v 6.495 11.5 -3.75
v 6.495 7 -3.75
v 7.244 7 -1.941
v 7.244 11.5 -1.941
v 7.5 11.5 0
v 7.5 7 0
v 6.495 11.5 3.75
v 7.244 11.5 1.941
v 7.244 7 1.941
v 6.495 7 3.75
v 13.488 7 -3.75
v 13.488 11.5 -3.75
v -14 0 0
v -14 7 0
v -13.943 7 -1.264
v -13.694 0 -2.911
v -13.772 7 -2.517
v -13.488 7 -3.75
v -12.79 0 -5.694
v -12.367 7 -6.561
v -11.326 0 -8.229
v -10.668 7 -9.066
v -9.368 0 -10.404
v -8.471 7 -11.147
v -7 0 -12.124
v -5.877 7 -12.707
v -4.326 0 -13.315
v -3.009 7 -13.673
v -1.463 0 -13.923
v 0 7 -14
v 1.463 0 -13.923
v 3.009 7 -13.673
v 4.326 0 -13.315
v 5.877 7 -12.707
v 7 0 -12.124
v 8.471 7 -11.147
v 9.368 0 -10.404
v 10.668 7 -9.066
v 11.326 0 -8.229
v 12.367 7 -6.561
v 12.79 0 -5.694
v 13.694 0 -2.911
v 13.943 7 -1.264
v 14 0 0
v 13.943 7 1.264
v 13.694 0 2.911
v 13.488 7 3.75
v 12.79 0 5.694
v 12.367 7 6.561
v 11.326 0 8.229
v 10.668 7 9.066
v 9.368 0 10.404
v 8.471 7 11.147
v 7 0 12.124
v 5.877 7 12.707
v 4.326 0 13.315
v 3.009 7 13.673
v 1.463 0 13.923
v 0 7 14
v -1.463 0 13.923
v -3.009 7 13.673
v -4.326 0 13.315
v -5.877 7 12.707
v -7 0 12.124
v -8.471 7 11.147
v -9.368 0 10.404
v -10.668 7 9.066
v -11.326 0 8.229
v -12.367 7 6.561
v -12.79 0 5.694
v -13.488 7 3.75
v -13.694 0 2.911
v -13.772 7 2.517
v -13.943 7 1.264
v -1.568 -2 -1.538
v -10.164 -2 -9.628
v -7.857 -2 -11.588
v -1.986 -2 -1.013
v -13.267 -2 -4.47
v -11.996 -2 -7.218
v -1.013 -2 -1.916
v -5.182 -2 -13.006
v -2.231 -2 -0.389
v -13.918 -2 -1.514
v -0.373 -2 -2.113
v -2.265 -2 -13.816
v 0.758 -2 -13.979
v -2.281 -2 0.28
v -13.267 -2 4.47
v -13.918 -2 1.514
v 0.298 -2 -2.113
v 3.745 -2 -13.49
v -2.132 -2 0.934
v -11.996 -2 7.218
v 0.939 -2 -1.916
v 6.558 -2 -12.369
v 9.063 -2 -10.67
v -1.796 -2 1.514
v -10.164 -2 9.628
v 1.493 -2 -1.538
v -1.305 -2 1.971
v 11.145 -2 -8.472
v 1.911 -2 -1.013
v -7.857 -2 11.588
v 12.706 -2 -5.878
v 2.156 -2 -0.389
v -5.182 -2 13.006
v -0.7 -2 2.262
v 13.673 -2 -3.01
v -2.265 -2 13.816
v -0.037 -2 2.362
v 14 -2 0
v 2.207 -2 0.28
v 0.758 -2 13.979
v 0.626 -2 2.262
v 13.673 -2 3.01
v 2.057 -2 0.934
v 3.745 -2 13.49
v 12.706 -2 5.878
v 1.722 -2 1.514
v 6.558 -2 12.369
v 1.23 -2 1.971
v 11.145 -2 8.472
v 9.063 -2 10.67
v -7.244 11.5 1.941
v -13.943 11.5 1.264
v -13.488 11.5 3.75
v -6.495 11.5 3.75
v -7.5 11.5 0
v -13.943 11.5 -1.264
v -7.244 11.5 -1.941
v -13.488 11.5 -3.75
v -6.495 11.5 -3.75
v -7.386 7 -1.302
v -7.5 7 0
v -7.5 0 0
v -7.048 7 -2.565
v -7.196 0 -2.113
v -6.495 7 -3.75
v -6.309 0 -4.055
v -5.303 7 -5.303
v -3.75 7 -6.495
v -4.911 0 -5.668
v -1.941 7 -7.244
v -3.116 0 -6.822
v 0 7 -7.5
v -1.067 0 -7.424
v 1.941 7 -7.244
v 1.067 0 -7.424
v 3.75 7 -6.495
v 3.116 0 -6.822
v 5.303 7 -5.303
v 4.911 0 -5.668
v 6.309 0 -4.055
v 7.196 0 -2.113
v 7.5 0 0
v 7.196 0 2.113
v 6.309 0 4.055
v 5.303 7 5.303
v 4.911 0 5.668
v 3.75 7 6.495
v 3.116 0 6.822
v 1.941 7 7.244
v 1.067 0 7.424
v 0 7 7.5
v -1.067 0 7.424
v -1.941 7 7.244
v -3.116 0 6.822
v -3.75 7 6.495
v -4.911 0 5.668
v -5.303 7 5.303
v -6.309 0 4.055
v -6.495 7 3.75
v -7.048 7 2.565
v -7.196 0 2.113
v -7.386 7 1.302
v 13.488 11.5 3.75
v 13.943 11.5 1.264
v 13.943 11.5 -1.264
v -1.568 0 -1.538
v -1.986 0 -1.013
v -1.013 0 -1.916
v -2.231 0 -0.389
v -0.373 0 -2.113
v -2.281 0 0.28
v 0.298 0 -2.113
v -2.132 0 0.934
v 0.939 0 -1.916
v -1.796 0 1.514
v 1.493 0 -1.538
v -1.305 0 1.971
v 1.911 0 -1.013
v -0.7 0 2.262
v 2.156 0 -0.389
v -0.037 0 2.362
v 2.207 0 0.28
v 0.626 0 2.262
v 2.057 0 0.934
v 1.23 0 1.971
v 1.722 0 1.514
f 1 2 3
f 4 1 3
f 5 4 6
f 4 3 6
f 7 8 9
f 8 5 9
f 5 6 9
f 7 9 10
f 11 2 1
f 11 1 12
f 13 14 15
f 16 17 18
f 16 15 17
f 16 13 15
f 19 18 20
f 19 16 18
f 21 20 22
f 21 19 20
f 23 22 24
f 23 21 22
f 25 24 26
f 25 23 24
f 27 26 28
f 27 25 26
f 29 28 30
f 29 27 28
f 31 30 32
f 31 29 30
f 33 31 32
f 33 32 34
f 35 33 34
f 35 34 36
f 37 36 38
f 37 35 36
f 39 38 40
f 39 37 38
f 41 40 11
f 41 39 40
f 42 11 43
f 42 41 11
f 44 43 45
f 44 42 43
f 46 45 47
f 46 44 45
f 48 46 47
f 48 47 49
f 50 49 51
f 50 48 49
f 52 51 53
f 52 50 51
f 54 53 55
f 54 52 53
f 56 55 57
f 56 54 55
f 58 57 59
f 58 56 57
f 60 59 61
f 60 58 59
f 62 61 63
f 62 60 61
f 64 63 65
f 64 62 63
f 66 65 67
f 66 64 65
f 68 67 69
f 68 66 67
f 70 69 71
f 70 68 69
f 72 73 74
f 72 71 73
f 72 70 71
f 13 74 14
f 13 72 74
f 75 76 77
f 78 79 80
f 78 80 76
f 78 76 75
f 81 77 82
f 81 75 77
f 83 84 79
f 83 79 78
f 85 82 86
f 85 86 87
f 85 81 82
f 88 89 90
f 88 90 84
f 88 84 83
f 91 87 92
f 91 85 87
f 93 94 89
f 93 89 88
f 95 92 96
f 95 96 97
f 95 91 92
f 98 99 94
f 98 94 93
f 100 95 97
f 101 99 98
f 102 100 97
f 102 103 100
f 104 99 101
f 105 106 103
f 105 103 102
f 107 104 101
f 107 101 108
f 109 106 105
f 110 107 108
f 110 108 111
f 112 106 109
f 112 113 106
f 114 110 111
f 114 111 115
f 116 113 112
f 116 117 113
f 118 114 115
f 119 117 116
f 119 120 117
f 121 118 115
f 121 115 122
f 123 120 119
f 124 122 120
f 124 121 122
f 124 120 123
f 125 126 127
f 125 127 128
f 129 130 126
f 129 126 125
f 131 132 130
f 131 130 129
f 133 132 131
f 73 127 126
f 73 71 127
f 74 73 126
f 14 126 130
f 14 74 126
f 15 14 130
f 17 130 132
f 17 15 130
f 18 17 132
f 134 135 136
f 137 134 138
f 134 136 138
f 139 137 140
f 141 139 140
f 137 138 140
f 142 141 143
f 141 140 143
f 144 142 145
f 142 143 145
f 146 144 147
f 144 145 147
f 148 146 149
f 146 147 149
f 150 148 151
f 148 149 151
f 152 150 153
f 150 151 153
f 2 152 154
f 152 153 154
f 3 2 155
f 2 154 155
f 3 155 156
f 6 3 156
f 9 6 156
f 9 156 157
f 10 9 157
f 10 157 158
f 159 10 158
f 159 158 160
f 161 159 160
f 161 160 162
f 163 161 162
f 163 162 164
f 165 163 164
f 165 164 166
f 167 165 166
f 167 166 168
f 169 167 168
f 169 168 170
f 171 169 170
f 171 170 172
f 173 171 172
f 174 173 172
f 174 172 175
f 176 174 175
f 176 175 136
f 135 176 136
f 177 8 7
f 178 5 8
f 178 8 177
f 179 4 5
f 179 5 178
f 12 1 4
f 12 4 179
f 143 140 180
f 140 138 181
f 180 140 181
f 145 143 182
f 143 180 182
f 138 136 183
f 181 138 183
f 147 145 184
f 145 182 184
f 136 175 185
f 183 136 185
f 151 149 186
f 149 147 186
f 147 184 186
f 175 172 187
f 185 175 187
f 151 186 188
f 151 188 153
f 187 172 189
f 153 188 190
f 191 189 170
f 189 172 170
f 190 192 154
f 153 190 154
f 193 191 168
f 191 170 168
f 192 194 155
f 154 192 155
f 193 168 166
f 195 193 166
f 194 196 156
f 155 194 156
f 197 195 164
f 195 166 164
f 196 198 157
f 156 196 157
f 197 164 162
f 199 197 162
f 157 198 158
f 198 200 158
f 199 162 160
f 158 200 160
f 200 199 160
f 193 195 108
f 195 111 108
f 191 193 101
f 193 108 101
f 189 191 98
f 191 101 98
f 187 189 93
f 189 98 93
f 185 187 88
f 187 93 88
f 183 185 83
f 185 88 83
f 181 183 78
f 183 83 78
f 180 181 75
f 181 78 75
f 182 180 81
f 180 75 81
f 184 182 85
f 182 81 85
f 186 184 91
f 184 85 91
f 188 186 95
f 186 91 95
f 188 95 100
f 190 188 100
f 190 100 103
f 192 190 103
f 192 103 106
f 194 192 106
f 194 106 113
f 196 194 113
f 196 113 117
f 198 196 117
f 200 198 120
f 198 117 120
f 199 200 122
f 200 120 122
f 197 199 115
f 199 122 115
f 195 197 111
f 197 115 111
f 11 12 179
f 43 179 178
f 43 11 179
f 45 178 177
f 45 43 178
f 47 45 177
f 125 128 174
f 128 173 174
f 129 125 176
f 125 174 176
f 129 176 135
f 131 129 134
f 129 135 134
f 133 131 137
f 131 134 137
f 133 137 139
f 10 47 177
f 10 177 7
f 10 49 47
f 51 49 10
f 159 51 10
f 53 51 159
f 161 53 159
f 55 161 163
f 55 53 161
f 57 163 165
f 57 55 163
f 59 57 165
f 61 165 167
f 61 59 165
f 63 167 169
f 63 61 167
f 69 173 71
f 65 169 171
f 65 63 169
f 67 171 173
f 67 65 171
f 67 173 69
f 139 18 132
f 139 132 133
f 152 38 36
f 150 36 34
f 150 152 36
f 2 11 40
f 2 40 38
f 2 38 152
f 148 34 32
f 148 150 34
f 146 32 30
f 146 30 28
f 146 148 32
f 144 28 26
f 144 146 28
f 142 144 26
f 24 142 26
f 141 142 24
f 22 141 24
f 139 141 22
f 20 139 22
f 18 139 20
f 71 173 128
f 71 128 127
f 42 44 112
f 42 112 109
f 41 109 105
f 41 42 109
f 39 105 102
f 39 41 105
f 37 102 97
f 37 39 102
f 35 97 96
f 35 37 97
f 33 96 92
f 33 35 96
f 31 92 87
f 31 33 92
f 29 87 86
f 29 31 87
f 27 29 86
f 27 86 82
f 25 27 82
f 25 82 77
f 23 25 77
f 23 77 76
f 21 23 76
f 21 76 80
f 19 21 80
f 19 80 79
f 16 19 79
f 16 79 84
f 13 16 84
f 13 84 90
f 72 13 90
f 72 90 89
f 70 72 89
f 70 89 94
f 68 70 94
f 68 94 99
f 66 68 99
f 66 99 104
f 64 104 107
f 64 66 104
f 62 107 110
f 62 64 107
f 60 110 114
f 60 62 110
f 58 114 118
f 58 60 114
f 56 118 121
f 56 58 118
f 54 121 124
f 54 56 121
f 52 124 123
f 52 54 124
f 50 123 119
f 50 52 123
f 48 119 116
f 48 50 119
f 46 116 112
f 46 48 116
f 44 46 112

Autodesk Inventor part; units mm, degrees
ref_plane "YZ Plane" through (0, 0, 0) normal (1, 0, 0) x (0, 1, 0)
ref_plane "XZ Plane" through (0, 0, 0) normal (0, 1, 0) x (-1, 0, 0)
ref_plane "XY Plane" through (0, 0, 0) normal (0, 0, 1) x (1, 0, 0)
sketch "Sketch1" plane through (0, 0, 0) normal (0, 1, 0) x (-1, 0, 0)
  circle A0 centre (0, 0) radius 14
  circle A1 centre (0, 0) radius 7.5
  dimension "d0" = 28
  dimension "d1" = 15
extrude "Extrusion1" add sketch "Sketch1" along normal blind 7
sketch "Sketch2" plane through (0, 7, 0) normal (0, 1, 0) x (1, 0, 0)
  line L0 (14, -3.75) -> (-14, -3.75)
  line L1 (-14, -3.75) -> (-14, 3.75)
  line L2 (-14, 3.75) -> (14, 3.75)
  line L3 (14, 3.75) -> (14, -3.75)
  line L4 (14, -3.75) -> (-14, 3.75) construction
  line L5 (-14, -3.75) -> (14, 3.75) construction
  line L6 (-0.5, 5) -> (0.5, 5)
  line L7 (0.5, 5) -> (0.5, -5)
  line L8 (0.5, -5) -> (-0.5, -5)
  line L9 (-0.5, -5) -> (-0.5, 5)
  line L10 (-0.5, 5) -> (0.5, -5) construction
  line L11 (0.5, 5) -> (-0.5, -5) construction
  circle A0 centre (0, 0) radius 7.5
  circle A1 centre (0, 0) radius 14
  point P0 (0, 0)
  point P1 (-13.4884, 3.75)
  point P2 (-13.4884, -3.75)
  point P3 (-6.4952, -3.75)
  point P4 (-6.4952, 3.75)
  point P5 (13.4884, 3.75)
  point P6 (6.4952, 3.75)
  point P7 (6.4952, -3.75)
  point P8 (13.4884, -3.75)
  dimension "d4" = 28
  dimension "d5" = 7.5
  dimension "d27" = 15
  dimension "d28" = 28
sketch "Sketch3" plane through (0, 0, 0) normal (0, -1, 0) x (1, 0, 0)
  circle A0 centre (0, 0) radius 14
  dimension "d17" = 28
extrude "Extrusion3" add sketch "Sketch3" along normal blind 2
sketch "Sketch5" plane through (0, 0, 0) normal (0, 1, 0) x (1, 0, 0)
  point P0 (0, 0)
  point P1 (-0.0372, -0.1116)
hole "Hole2" at (-0.0372, 0, 0.1116) direction (0, -1, 0) diameter 4.5 end through all clearance for "Hex Head Machine Screw" size "M4" standard "Ansi Metric M Profile"
extrude "Extrusion4" add sketch "Sketch2" along normal blind 4.5 contours L0 A0 L2 A1 | A1 L2 A0 L0
properties part number "magneticslotV1"
